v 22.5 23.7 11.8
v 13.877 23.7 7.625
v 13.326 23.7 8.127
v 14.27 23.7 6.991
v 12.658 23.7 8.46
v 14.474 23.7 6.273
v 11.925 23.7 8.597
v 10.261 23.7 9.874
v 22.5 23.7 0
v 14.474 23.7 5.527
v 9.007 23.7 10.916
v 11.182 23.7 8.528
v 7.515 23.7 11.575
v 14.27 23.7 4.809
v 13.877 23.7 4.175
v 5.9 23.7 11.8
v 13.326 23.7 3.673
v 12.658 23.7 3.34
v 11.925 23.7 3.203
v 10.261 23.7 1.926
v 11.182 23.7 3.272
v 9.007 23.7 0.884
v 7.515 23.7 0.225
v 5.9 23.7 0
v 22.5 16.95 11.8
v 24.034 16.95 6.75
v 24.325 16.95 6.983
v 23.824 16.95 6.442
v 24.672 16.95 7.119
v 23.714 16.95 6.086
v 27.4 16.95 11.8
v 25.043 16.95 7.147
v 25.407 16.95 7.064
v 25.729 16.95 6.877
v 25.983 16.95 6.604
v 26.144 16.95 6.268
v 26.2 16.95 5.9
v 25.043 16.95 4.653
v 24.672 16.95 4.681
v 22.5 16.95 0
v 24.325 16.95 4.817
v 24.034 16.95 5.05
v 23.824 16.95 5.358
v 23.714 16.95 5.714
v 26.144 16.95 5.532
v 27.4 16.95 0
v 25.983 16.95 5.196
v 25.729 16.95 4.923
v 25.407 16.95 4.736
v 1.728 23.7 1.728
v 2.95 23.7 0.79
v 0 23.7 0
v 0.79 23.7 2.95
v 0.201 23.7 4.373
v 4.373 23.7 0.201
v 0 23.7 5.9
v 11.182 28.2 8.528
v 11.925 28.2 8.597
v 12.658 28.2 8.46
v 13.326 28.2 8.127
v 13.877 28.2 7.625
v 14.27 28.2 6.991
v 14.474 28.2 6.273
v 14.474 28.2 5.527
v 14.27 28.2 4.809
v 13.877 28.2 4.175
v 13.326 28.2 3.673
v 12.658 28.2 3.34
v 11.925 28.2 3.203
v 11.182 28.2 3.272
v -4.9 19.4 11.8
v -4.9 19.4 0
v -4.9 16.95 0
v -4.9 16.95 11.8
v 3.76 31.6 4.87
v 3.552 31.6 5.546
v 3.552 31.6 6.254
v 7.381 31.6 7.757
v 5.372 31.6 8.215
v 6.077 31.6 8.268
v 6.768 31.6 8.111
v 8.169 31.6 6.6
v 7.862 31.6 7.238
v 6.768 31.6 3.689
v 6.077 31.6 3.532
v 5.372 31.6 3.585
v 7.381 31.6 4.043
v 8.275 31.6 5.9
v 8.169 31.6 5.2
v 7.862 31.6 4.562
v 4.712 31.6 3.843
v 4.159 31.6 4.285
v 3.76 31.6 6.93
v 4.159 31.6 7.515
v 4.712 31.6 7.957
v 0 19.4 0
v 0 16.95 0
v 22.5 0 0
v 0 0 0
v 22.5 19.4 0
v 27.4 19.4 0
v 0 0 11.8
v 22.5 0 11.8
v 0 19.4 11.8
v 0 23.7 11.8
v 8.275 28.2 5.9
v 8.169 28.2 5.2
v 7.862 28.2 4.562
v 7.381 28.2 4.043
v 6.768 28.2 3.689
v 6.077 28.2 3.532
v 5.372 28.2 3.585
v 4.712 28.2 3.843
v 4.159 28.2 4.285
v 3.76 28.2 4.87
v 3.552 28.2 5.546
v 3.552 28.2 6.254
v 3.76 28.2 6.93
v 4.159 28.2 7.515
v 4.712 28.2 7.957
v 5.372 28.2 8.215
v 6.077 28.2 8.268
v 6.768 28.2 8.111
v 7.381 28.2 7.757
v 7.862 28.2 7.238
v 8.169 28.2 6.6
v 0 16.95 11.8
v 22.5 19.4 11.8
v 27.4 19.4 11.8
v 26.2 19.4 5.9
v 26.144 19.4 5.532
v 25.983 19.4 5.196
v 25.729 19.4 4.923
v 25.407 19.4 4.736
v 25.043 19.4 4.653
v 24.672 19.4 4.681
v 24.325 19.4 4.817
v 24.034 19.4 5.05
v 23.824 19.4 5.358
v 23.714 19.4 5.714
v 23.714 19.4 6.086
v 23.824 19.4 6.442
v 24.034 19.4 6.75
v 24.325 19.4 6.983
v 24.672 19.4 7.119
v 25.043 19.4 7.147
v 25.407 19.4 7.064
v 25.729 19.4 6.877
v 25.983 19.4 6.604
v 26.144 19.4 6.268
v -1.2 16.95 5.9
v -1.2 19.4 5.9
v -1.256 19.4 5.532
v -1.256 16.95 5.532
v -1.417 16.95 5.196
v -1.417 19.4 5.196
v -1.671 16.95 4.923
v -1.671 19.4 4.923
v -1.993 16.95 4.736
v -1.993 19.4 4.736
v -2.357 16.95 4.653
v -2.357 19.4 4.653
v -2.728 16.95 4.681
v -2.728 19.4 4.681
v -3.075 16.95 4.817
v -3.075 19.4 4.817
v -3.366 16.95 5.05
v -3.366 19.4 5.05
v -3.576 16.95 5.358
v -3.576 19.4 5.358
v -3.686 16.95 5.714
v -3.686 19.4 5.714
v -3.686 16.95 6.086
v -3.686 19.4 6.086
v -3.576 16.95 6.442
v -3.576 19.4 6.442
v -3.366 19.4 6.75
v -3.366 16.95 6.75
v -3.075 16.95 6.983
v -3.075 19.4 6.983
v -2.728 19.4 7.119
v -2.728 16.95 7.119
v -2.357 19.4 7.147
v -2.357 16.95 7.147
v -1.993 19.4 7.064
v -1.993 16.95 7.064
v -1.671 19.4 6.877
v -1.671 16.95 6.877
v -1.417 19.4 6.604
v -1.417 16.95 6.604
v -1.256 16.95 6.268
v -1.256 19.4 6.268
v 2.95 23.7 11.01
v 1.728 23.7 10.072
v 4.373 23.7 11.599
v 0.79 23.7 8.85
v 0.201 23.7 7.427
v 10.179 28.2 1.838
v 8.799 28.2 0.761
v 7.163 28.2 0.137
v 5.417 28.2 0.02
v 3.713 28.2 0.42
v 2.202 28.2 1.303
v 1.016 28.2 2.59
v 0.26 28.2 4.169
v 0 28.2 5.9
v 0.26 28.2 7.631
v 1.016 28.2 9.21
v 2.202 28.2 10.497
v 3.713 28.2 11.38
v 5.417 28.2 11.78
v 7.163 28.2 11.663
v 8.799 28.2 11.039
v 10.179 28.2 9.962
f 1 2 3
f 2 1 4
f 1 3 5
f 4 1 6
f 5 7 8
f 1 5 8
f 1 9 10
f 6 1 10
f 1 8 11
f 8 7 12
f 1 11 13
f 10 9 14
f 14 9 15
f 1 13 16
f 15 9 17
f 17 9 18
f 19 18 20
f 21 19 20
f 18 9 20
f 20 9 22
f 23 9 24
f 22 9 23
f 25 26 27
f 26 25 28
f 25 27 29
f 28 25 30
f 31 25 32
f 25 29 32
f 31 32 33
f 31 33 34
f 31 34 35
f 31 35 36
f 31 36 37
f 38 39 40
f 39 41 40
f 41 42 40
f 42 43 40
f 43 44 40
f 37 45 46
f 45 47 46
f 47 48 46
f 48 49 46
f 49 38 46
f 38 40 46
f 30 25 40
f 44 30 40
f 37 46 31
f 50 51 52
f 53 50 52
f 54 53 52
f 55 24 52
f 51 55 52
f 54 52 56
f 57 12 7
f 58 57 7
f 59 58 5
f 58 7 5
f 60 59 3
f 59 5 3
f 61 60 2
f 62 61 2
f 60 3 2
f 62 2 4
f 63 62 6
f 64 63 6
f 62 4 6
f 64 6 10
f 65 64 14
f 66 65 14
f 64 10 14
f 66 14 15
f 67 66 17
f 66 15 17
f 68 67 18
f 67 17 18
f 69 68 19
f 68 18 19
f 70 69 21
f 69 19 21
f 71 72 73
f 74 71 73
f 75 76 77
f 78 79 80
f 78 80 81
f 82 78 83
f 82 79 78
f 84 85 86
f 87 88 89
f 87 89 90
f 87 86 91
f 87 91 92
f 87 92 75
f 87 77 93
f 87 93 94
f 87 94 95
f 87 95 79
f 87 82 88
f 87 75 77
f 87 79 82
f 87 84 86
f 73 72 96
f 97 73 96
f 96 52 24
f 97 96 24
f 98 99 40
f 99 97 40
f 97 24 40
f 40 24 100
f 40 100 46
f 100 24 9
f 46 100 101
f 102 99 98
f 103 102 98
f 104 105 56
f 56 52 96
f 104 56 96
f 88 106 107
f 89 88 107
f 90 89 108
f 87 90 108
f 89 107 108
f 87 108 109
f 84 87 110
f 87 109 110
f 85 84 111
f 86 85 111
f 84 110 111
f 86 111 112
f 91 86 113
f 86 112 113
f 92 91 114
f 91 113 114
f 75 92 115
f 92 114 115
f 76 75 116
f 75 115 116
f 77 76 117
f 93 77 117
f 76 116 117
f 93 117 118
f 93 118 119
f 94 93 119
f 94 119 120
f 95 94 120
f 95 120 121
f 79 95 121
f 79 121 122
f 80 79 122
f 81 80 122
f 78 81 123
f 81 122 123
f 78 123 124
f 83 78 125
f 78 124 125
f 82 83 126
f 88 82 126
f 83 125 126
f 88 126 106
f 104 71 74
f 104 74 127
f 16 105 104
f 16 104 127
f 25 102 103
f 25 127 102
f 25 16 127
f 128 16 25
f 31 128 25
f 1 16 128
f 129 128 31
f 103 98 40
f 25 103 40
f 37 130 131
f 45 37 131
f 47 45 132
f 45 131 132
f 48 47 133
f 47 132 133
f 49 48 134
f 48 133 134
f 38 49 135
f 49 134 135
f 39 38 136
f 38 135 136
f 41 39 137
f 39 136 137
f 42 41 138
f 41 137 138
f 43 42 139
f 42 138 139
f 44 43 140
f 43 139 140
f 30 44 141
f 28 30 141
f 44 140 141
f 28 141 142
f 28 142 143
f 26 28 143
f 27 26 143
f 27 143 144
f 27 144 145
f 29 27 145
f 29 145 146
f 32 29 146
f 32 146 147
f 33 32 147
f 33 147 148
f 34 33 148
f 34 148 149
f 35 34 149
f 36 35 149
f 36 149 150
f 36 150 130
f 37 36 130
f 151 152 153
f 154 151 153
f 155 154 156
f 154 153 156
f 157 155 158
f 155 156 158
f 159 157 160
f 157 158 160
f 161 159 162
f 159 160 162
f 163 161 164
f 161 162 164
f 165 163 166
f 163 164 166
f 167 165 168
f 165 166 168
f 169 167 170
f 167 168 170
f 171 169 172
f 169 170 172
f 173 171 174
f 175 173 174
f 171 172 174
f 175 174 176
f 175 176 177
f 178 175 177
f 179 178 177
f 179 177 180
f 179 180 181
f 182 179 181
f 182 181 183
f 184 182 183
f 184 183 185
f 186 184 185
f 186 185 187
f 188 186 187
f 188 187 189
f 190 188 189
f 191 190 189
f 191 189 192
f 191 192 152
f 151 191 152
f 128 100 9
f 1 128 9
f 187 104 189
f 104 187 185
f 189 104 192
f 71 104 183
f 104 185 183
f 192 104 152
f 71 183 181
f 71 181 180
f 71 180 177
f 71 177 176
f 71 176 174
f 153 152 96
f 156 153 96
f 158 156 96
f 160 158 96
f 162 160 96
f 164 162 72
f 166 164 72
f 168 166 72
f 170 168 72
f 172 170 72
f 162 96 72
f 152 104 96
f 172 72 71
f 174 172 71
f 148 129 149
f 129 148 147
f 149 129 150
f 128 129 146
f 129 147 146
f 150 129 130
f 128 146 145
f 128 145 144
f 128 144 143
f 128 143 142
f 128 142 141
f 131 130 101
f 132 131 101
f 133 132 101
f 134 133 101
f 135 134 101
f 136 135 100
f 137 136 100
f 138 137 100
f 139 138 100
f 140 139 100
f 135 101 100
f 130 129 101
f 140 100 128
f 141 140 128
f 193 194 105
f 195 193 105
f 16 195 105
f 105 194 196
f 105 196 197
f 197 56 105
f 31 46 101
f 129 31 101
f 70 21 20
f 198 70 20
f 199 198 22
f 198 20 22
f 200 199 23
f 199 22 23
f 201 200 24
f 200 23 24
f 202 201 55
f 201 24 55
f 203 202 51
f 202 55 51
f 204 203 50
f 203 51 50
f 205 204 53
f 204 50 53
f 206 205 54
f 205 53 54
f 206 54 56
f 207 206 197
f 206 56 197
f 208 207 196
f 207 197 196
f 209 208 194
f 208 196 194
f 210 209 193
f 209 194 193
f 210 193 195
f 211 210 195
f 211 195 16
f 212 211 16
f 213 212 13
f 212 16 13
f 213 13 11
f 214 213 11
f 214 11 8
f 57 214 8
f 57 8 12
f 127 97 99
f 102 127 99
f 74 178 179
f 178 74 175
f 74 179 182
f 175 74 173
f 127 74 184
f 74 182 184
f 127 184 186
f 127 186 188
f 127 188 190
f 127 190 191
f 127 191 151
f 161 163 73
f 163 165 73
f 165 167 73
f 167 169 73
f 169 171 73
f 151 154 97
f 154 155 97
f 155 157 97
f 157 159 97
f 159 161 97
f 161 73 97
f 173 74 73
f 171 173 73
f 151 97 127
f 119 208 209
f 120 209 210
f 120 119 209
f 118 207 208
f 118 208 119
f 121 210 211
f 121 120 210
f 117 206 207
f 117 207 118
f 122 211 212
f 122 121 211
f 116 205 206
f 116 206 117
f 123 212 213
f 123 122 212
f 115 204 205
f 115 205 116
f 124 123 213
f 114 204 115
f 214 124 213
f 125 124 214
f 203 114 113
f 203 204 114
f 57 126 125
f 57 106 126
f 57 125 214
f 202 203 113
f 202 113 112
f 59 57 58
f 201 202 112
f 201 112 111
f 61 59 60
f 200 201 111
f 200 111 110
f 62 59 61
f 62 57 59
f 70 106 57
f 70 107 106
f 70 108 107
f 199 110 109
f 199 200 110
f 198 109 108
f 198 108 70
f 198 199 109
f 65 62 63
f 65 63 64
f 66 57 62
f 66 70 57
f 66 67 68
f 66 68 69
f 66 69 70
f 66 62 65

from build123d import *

# Parameters (mm, degrees)
BOSS_EXTRUDE1_DEPTH = 11.8
BOSS_EXTRUDE2_DEPTH = 4.5
SKETCH3_R           = 2.375
BOSS_EXTRUDE3_DEPTH = 3.4
CUT_EXTRUDE1_REACH  = 21.4
SKETCH4_R           = 1.25


with BuildPart() as part:
    # Sketch1 → Boss-Extrude1 (new body)
    with BuildSketch(Plane.XY):
        Polygon((0, 0), (22.5, 0), (22.5, 16.95), (27.4, 16.95), (27.4, 19.4), (22.5, 19.4), (22.5, 23.7), (0, 23.7), (0, 19.4), (-4.9, 19.4), (-4.9, 16.95), (0, 16.95), align=None)
    extrude(amount=BOSS_EXTRUDE1_DEPTH)

    # Sketch2 → Boss-Extrude2 (add)
    with BuildSketch(Plane(origin=(0, 23.7, 0), x_dir=(1, 0, 0), z_dir=(0, 1, 0))):
        with BuildLine():
            ThreePointArc((11.18220339, -3.271630287), (0, -5.9), (11.18220339, -8.528369713))
            ThreePointArc((11.18220339, -8.528369713), (14.5, -5.9), (11.18220339, -3.271630287))
        make_face()
    extrude(amount=BOSS_EXTRUDE2_DEPTH)

    # Sketch3 → Boss-Extrude3 (add)
    with BuildSketch(Plane(origin=(0, 28.2, 0), x_dir=(1, 0, 0), z_dir=(0, 1, 0))):
        with Locations((5.9, -5.9)):
            Circle(SKETCH3_R)
    extrude(amount=BOSS_EXTRUDE3_DEPTH)

    # Sketch4 → Cut-Extrude1 (cut, up to next)
    with BuildSketch(Plane(origin=(0, 19.4, 0), x_dir=(1, 0, 0), z_dir=(0, 1, 0)), mode=Mode.PRIVATE) as cut_extrude1_sk1:
        with Locations((-2.45, -5.9)):
            Circle(SKETCH4_R)
    cut_extrude1_tool1 = extrude(cut_extrude1_sk1.sketch, amount=-CUT_EXTRUDE1_REACH, mode=Mode.PRIVATE) & part.part
    add(cut_extrude1_tool1.solids().sort_by_distance((-2.45, 19.4, 5.9))[0], mode=Mode.SUBTRACT)
    # Sketch4 → Cut-Extrude1 (cut, up to next)
    with BuildSketch(Plane(origin=(0, 19.4, 0), x_dir=(1, 0, 0), z_dir=(0, 1, 0)), mode=Mode.PRIVATE) as cut_extrude1_sk2:
        with Locations((24.95, -5.9)):
            Circle(SKETCH4_R)
    cut_extrude1_tool2 = extrude(cut_extrude1_sk2.sketch, amount=-CUT_EXTRUDE1_REACH, mode=Mode.PRIVATE) & part.part
    add(cut_extrude1_tool2.solids().sort_by_distance((24.95, 19.4, 5.9))[0], mode=Mode.SUBTRACT)


solid = part.part
